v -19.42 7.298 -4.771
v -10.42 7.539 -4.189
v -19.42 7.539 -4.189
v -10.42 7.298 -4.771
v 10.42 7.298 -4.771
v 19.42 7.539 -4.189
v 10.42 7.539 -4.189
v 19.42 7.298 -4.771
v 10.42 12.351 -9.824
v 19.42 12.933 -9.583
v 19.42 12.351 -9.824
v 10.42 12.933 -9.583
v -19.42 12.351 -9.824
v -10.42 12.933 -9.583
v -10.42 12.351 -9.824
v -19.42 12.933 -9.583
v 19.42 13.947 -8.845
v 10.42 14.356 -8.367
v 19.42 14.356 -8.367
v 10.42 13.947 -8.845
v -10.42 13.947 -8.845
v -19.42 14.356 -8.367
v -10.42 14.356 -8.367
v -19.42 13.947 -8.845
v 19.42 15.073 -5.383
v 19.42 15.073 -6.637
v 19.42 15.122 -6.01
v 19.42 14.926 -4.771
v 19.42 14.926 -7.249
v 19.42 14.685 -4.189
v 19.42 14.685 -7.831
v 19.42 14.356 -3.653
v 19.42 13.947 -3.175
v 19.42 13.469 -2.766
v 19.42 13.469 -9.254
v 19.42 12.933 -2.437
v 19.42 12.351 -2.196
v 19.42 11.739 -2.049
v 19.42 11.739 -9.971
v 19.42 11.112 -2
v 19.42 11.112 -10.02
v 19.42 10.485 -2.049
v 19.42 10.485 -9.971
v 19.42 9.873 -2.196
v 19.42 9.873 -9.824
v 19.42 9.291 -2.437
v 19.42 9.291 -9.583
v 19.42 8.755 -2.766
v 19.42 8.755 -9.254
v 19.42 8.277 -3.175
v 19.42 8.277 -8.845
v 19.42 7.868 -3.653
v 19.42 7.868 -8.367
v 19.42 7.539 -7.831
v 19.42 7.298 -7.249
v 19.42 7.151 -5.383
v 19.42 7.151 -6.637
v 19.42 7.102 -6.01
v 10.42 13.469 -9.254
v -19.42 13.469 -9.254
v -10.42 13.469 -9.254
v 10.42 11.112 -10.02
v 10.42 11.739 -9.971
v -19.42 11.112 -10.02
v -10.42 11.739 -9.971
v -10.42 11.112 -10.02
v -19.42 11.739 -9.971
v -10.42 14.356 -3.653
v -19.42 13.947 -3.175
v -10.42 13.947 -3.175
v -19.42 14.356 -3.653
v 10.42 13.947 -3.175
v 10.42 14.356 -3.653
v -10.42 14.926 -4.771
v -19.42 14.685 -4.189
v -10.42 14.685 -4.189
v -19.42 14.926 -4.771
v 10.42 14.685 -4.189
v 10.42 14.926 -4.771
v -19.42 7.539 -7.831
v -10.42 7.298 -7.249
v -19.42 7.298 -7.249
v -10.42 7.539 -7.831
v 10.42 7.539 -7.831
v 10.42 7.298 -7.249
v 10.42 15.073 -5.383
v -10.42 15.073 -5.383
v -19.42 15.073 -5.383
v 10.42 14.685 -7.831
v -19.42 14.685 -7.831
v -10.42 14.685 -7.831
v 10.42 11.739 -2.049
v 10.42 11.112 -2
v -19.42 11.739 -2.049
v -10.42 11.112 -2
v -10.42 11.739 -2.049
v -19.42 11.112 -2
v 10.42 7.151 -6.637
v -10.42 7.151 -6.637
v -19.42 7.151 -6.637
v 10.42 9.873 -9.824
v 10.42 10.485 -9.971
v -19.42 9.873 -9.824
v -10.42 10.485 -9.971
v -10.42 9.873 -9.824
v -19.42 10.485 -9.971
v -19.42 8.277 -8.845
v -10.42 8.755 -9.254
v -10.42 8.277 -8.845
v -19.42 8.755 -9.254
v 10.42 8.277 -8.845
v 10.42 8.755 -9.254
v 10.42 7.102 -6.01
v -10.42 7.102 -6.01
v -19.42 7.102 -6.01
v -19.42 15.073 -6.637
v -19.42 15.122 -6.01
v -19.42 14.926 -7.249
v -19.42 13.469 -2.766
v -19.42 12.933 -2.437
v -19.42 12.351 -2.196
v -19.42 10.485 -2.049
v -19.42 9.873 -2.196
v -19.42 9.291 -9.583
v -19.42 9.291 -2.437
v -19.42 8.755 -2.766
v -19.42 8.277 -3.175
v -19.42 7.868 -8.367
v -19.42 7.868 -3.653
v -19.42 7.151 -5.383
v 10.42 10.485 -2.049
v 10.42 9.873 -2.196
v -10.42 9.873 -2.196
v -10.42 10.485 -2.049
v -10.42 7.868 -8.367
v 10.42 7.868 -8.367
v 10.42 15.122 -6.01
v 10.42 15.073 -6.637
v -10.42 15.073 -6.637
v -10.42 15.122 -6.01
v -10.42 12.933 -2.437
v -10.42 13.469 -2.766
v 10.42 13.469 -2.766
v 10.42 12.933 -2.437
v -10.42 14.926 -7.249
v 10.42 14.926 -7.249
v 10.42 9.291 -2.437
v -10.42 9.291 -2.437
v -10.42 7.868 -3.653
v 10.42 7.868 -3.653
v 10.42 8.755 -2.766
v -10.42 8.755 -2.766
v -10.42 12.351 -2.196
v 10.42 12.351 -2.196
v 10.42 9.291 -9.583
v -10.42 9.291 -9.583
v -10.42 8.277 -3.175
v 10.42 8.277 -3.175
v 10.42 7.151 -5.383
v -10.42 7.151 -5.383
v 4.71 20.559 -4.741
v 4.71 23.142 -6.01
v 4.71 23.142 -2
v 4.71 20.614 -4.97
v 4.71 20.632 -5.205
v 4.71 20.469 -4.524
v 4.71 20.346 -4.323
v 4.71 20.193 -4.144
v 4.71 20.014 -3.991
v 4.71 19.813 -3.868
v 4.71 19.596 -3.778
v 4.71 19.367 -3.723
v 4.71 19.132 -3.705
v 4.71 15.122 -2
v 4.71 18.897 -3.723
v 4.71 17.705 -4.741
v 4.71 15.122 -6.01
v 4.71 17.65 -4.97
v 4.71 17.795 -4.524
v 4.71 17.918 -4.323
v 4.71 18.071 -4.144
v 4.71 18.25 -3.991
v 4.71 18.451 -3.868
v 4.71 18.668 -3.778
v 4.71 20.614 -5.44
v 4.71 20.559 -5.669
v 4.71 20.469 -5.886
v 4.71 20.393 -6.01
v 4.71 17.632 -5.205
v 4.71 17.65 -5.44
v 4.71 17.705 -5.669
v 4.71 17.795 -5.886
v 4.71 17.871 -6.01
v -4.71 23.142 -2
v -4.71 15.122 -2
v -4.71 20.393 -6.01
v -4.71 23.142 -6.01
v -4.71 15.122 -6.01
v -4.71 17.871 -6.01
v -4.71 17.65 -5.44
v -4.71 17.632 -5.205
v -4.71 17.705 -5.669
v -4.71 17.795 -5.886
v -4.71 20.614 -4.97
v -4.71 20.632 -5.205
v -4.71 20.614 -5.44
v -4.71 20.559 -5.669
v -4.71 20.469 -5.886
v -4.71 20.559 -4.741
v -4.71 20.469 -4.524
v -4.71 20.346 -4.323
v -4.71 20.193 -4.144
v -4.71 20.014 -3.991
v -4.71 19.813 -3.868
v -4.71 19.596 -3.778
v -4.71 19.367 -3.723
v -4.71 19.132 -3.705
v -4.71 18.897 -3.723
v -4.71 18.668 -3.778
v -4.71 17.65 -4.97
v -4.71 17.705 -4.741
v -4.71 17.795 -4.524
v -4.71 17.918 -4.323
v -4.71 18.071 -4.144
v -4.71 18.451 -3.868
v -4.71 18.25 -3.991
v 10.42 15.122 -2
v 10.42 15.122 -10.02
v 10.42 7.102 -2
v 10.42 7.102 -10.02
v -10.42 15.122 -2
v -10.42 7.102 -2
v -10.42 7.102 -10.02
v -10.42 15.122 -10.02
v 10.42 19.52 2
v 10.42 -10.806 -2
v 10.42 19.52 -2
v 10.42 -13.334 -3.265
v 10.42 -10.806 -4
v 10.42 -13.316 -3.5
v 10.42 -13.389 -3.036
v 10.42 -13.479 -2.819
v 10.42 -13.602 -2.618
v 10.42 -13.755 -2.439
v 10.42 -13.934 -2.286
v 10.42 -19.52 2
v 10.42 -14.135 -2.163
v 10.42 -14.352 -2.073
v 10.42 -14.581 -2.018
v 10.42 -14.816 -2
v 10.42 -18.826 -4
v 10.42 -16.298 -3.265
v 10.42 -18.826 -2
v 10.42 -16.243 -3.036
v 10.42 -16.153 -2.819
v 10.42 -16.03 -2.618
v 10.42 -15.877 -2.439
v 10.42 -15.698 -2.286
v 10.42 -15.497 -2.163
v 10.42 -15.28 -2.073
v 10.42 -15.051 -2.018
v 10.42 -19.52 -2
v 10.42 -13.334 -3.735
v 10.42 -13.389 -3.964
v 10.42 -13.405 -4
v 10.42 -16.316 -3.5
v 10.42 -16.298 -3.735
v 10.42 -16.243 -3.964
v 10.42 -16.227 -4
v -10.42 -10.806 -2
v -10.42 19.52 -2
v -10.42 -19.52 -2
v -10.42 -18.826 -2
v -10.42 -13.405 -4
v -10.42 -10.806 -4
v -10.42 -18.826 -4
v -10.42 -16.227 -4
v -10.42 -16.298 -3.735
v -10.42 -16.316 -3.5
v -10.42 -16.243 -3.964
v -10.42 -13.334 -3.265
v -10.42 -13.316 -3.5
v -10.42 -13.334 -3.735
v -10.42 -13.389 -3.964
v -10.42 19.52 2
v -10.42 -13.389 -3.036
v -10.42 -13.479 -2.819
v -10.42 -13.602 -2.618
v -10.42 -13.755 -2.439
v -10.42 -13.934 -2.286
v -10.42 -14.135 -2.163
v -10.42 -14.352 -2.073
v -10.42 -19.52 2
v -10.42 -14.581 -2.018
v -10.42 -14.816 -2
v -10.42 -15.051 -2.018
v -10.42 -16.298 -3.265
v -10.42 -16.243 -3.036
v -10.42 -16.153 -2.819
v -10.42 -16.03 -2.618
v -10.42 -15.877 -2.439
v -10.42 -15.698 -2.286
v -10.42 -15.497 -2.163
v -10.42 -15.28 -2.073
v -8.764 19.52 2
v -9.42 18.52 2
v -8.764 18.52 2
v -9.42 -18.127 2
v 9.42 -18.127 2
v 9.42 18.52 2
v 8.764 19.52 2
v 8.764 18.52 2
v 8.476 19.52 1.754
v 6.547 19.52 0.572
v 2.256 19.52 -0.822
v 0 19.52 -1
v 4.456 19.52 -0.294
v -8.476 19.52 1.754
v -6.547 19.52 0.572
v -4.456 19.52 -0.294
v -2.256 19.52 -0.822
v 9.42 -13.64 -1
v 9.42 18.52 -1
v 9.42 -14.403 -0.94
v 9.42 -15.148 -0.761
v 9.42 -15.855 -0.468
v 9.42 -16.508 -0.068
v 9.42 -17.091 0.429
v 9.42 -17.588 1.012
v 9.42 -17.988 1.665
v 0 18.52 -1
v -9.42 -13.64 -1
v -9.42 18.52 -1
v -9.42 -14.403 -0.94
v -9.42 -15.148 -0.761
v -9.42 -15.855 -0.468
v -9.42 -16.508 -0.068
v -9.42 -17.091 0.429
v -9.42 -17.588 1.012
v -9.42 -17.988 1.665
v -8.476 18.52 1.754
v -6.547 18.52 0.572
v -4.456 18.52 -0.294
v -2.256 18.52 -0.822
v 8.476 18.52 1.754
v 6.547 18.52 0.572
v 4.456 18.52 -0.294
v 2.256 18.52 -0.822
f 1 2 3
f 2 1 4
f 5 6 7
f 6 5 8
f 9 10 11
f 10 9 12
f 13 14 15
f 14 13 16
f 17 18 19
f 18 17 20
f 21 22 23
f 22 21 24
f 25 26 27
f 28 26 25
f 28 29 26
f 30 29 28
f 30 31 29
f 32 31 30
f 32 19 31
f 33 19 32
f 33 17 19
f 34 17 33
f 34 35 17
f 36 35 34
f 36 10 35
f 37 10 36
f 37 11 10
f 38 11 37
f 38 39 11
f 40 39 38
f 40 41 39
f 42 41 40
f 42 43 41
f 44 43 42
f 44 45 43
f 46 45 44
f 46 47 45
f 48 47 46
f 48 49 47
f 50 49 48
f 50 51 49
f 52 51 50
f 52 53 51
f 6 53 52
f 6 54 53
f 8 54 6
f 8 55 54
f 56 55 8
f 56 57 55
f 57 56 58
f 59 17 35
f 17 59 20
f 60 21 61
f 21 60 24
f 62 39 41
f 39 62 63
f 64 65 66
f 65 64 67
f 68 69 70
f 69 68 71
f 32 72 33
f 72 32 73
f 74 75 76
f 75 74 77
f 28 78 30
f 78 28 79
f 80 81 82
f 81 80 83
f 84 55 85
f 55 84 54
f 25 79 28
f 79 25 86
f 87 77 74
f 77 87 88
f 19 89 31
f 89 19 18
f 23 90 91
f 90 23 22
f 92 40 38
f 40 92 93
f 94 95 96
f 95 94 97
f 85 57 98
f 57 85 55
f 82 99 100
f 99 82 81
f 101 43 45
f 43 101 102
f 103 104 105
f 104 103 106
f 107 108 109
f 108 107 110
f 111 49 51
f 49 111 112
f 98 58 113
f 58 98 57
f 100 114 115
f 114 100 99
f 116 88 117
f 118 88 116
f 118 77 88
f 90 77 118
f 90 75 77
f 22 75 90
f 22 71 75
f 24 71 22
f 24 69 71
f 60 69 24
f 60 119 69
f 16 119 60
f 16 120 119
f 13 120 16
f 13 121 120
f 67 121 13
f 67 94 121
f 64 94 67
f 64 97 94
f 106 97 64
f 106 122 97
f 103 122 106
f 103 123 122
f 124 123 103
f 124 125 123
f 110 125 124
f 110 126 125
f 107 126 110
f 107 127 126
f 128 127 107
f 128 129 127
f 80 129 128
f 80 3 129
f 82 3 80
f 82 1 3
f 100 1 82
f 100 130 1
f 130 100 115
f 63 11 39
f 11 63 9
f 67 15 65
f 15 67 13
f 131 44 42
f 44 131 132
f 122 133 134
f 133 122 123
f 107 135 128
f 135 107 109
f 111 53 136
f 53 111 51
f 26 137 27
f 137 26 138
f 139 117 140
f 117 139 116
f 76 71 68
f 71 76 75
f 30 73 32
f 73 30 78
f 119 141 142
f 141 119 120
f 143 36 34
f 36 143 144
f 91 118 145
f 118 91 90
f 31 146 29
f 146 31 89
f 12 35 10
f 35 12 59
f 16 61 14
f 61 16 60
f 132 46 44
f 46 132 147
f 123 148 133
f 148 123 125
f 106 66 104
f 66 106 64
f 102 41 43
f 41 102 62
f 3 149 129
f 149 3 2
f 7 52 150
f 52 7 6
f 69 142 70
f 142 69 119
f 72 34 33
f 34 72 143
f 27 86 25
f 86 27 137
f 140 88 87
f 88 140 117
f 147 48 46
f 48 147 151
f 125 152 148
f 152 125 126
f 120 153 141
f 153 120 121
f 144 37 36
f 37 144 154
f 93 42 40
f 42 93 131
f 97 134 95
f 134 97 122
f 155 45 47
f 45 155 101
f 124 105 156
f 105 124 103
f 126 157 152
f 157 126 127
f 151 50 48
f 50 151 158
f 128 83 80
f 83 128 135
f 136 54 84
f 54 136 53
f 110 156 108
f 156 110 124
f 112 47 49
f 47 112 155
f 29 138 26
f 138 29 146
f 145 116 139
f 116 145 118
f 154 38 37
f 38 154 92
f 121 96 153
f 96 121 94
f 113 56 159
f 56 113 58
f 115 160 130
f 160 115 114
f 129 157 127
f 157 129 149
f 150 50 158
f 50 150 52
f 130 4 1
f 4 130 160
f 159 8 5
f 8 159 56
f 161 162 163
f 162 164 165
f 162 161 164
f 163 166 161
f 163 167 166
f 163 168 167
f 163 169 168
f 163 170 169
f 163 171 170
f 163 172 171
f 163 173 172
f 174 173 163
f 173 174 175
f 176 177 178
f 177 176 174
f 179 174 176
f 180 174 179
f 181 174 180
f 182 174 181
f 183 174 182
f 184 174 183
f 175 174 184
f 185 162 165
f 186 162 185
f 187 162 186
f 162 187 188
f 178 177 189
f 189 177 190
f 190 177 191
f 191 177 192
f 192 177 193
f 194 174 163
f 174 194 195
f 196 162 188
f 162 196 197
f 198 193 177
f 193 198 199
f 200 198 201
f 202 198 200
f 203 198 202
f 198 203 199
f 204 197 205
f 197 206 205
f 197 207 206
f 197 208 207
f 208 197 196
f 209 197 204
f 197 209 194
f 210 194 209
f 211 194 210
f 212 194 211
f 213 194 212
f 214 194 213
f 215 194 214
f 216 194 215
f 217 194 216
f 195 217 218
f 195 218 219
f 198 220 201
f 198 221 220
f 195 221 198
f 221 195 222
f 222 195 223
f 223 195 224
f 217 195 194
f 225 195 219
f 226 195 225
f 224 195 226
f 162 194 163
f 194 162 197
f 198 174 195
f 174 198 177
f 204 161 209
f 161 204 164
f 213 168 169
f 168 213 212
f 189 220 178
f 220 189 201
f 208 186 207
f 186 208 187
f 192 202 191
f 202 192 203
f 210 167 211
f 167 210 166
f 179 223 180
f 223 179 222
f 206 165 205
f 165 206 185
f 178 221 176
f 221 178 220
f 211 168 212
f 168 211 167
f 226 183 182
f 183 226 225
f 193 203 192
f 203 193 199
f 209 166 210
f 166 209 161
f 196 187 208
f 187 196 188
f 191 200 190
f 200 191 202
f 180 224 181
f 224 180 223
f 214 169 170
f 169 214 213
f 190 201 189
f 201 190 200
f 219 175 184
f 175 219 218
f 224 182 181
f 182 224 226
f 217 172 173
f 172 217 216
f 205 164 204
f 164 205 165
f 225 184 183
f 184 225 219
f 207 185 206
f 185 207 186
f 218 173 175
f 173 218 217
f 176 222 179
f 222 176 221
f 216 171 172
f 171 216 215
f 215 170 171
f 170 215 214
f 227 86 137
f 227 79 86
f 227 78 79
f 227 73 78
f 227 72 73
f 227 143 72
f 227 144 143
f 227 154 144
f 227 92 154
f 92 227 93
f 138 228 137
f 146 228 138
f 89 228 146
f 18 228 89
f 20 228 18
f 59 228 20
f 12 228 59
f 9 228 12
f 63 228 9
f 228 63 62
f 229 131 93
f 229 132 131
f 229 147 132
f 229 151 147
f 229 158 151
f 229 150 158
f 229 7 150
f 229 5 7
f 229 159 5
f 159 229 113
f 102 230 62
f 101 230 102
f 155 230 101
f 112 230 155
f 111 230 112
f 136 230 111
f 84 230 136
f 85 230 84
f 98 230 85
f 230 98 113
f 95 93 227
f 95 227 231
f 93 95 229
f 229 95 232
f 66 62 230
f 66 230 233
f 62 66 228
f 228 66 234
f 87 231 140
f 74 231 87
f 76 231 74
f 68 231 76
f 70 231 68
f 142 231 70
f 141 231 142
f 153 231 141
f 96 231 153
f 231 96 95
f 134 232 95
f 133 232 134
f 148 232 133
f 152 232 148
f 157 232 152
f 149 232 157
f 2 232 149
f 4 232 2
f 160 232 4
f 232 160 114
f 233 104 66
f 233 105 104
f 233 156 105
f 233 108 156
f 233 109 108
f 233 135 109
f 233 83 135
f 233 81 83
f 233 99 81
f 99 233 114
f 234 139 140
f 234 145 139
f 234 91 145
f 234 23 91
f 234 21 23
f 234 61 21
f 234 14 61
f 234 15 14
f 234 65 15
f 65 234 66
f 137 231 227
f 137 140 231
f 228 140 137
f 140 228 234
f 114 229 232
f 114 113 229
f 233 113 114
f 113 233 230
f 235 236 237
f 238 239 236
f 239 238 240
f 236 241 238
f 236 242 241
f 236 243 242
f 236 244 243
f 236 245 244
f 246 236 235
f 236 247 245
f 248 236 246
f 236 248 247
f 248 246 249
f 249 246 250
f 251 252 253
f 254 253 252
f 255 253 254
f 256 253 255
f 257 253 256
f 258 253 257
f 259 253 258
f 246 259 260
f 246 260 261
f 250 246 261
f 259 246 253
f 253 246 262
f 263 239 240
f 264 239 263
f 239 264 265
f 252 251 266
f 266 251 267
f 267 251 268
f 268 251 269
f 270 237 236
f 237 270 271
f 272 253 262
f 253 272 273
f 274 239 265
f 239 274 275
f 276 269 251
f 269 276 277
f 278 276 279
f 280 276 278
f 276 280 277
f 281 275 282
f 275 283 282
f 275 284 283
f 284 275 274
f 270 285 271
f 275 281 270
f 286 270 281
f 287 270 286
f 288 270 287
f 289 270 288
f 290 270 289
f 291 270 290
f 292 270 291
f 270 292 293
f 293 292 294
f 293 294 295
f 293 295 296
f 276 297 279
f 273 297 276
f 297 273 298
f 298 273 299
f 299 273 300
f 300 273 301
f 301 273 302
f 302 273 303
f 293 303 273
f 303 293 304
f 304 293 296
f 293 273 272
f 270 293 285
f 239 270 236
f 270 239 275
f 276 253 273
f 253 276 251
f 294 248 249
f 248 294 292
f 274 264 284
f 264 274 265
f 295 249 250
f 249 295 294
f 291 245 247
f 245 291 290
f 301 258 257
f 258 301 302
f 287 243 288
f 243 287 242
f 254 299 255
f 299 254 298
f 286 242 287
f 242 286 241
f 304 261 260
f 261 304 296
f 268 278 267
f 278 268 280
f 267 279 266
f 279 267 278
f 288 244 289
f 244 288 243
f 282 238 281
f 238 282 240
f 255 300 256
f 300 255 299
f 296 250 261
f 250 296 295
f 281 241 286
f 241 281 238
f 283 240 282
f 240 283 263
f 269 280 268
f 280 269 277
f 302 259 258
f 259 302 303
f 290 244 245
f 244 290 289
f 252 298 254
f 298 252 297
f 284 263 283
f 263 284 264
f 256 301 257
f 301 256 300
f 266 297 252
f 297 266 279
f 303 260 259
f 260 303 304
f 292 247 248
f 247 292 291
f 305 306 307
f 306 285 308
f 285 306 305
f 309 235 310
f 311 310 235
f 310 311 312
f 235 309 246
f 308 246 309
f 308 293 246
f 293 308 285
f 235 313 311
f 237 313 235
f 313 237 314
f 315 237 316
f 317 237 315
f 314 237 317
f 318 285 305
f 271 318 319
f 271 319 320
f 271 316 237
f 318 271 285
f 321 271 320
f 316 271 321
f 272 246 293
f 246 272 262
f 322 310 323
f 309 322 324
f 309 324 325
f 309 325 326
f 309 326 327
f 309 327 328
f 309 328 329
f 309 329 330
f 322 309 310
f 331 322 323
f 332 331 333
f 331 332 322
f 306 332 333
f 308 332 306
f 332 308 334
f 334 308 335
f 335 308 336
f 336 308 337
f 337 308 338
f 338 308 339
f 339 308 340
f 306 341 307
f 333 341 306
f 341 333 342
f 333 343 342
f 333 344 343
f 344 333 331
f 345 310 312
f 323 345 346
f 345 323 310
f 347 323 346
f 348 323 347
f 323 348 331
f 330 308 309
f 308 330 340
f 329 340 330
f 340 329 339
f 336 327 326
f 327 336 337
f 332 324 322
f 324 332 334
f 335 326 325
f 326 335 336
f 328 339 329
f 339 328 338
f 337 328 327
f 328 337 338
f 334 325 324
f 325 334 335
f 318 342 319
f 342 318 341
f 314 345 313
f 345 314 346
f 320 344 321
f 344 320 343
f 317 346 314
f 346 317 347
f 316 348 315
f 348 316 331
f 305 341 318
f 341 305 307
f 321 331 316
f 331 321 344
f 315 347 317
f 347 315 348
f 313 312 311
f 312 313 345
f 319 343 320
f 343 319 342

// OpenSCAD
// file: bearing_housing.scad
use <MCAD/regular_shapes.scad>

in = 8.04 / 2;
out = 22 / 2;
h = 7;

eps_in = 0.01;
eps_out = 0.1;

in_r = in - eps_in;
out_r = out + eps_out;

$fn=40;

module housing(h=h){
    cylinder_tube(h, out_r + 1, 1, center=true);
}

module axil(length=h*2){ 
    cylinder_tube(length, in_r, in_r, center=true);
}

//housing();
//axil();
// main file
use <MCAD/involute_gears.scad>;
include <bearing_housing.scad>;

tol = 0.1;

target_rad = 6.2;
inner_diam = 5.37;
chord_dist = 3.66;

length = 10;//20.73 + 4;
cog_t = 9;
pitch = 230;
cog_r =  6;
cog_teeth = round(cog_r * 360/pitch);

fix_depth = 7.65;

motor_w = 18.84;
motor_l = 37.04;
motor_flat_l = 32.16;

module small_gear(){
    difference(){
        union(){
        bevel_gear (
            number_of_teeth=cog_teeth, 
            cone_distance=50, 
            face_width=cog_t, 
            outside_circular_pitch=pitch, 
            pressure_angle=30,
            clearance = 0.2, 
            bore_diameter=0,
            gear_thickness = 2, 
            backlash = 0, 
            involute_facets=0, 
            finish = -1);
        join_r = target_rad * 0.6;
        //translate([0, 0, cog_t - length - tol]) cylinder(length, r1 = join_r, r2 = join_r, $fn=40);
        }
        //translate([0, 0, cog_t - length - tol])
        hole_depth = fix_depth + 2;
        intersection(){
            cylinder(hole_depth, r1 = inner_diam/2 + tol, r2 = inner_diam/2 + tol, $fn=40);
            translate([0, 0, fix_depth/2]) cube([chord_dist + tol, inner_diam + 2*tol, hole_depth], center=true);
        }
    }
}

big_cog_r =  out_r + 5 + 4;
big_cog_teeth = round(big_cog_r * 360/pitch);

module big_cog(){
    echo(bit_cog_r);
    echo(big_cog_teeth);

    difference(){
        bevel_gear (
            number_of_teeth=big_cog_teeth, 
            cone_distance=80, 
            face_width=cog_t, 
            outside_circular_pitch=pitch, 
            pressure_angle=30,
            clearance = 0.2, 
            bore_diameter=0,
            gear_thickness = 2, 
            backlash = 0, 
            involute_facets=0, 
            finish = -1);
        cylinder(fix_depth + 5, r1 = out_r, r2 = out_r, $fn=40);
    }
}

motor_rad = motor_l - motor_flat_l;

module body_mount(t = 1, h=4){
    translate([0, motor_l*0.3, -in_r - h/2]){
        rotate([0, 90, 0])
        axil(motor_w + 2*10);
        cube([motor_w + 2, in_r*2, in_r*2], center=true);
        translate([0, in_r*2, in_r/2]){
            difference(){
                cube([motor_w/2, in_r*2, in_r], center=true);
                translate([0, 0, -1.2]){
                    rotate([0, 90, 0])
                    cylinder(motor_w + 2*t, 1.5, 1.5, center=true);
                }
            }
        }
    }
    translate([0, -motor_l*0.4, -2 - h/2 + t]){
        difference(){
            cube([motor_w + 2, in_r*2, 2], center=true);
            translate([0, 0, -0.5]){
                rotate([0, 90, 0])
                cylinder(motor_w + 2*t, 1.5, 1.5, center=true);
            }
        }
    }
    difference(){
        cube([motor_w + 2 * t, motor_l + 2 * t, h], center=true);
        translate([0, (motor_rad)/2, t/2])
        cube([motor_w, motor_flat_l, h - t], center=true);
        translate([0, -motor_l/2 + (motor_l - motor_flat_l), motor_rad - h/2 + t])
        rotate([0, 90, 0])
        cylinder(motor_w, motor_rad, motor_rad, center=true);
        rad = motor_w/2 + 5;
        translate([0, motor_l/2, rad - h/2 + t]){
            rotate([90, 0, 0])
            cylinder(10, rad, rad, center=true);
        }
    }
}

body_mount();
//small_gear();
//big_cog();
